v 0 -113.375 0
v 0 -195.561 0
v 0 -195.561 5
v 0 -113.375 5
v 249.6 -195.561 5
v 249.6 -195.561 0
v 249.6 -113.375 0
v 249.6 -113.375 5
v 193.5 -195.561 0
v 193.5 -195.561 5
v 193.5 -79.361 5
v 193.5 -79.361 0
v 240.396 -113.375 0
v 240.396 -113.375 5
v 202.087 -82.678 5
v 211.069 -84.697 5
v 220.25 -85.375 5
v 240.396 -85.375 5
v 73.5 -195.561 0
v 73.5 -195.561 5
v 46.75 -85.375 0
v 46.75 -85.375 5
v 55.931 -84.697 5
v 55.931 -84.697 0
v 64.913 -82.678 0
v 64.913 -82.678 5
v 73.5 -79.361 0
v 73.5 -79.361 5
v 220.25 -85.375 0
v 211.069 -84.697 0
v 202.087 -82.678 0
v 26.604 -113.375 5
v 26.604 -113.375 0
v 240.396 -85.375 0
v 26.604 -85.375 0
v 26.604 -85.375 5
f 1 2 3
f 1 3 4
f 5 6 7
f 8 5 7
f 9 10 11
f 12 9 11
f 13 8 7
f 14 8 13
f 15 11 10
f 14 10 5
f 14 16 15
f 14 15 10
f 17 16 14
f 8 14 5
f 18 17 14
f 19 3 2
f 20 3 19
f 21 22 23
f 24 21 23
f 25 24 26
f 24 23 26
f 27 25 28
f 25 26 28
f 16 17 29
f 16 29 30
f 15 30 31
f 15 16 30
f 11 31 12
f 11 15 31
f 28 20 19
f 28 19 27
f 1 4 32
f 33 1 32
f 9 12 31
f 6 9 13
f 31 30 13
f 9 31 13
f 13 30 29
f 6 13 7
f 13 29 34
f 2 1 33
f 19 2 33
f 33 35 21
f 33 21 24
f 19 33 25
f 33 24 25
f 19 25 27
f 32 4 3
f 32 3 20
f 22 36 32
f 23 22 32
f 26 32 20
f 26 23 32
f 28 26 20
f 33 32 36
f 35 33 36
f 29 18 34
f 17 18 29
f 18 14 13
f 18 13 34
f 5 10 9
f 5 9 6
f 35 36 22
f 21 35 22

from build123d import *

# Parameters (mm, degrees)
SKETCH1_W           = 249.6
SKETCH1_H           = 267.4
BOSS_EXTRUDE1_DEPTH = 5
SKETCH5_W           = 249.6
SKETCH5_H           = 71.838779628
CUT_EXTRUDE3_DEPTH  = 6
SKETCH7_W           = 120
SKETCH7_H           = 195.561220372
CUT_EXTRUDE4_DEPTH  = 6


with BuildPart() as part:
    # Sketch1 → Boss-Extrude1 (new body)
    with BuildSketch(Plane.XY):
        with Locations((124.8, -133.7)):
            Rectangle(SKETCH1_W, SKETCH1_H)
    extrude(amount=BOSS_EXTRUDE1_DEPTH)

    # Sketch5 → Cut-Extrude3 (cut, through all)
    with BuildSketch(Plane.XY.offset(5)):
        with Locations((124.8, -231.480610186)):
            Rectangle(SKETCH5_W, SKETCH5_H)
        with BuildLine():
            Line((162.086136524, 0), (249.6, 0))
            Line((249.6, 0), (249.6, -113.374891146))
            Line((249.6, -113.374891146), (240.395661642, -113.374891146))
            Line((240.395661642, -113.374891146), (240.395661642, -85.374891146))
            Line((240.395661642, -85.374891146), (220.249607492, -85.374891146))
            ThreePointArc((220.249607492, -85.374891146), (168.597256642, -58.064160131), (162.086136524, 0))
        make_face()
        with BuildLine():
            Line((104.913863476, 0), (0, 0))
            Line((0, 0), (0, -113.374891146))
            Line((0, -113.374891146), (26.604338358, -113.374891146))
            Line((26.604338358, -113.374891146), (26.604338358, -85.374891146))
            Line((26.604338358, -85.374891146), (46.750392508, -85.374891146))
            ThreePointArc((46.750392508, -85.374891146), (98.402743358, -58.064160131), (104.913863476, 0))
        make_face()
    extrude(amount=-CUT_EXTRUDE3_DEPTH, mode=Mode.SUBTRACT)

    # Sketch7 → Cut-Extrude4 (cut, through all)
    with BuildSketch(Plane.XY.offset(5)):
        with Locations((133.5, -97.780610186)):
            Rectangle(SKETCH7_W, SKETCH7_H)
    extrude(amount=-CUT_EXTRUDE4_DEPTH, mode=Mode.SUBTRACT)


solid = part.part
